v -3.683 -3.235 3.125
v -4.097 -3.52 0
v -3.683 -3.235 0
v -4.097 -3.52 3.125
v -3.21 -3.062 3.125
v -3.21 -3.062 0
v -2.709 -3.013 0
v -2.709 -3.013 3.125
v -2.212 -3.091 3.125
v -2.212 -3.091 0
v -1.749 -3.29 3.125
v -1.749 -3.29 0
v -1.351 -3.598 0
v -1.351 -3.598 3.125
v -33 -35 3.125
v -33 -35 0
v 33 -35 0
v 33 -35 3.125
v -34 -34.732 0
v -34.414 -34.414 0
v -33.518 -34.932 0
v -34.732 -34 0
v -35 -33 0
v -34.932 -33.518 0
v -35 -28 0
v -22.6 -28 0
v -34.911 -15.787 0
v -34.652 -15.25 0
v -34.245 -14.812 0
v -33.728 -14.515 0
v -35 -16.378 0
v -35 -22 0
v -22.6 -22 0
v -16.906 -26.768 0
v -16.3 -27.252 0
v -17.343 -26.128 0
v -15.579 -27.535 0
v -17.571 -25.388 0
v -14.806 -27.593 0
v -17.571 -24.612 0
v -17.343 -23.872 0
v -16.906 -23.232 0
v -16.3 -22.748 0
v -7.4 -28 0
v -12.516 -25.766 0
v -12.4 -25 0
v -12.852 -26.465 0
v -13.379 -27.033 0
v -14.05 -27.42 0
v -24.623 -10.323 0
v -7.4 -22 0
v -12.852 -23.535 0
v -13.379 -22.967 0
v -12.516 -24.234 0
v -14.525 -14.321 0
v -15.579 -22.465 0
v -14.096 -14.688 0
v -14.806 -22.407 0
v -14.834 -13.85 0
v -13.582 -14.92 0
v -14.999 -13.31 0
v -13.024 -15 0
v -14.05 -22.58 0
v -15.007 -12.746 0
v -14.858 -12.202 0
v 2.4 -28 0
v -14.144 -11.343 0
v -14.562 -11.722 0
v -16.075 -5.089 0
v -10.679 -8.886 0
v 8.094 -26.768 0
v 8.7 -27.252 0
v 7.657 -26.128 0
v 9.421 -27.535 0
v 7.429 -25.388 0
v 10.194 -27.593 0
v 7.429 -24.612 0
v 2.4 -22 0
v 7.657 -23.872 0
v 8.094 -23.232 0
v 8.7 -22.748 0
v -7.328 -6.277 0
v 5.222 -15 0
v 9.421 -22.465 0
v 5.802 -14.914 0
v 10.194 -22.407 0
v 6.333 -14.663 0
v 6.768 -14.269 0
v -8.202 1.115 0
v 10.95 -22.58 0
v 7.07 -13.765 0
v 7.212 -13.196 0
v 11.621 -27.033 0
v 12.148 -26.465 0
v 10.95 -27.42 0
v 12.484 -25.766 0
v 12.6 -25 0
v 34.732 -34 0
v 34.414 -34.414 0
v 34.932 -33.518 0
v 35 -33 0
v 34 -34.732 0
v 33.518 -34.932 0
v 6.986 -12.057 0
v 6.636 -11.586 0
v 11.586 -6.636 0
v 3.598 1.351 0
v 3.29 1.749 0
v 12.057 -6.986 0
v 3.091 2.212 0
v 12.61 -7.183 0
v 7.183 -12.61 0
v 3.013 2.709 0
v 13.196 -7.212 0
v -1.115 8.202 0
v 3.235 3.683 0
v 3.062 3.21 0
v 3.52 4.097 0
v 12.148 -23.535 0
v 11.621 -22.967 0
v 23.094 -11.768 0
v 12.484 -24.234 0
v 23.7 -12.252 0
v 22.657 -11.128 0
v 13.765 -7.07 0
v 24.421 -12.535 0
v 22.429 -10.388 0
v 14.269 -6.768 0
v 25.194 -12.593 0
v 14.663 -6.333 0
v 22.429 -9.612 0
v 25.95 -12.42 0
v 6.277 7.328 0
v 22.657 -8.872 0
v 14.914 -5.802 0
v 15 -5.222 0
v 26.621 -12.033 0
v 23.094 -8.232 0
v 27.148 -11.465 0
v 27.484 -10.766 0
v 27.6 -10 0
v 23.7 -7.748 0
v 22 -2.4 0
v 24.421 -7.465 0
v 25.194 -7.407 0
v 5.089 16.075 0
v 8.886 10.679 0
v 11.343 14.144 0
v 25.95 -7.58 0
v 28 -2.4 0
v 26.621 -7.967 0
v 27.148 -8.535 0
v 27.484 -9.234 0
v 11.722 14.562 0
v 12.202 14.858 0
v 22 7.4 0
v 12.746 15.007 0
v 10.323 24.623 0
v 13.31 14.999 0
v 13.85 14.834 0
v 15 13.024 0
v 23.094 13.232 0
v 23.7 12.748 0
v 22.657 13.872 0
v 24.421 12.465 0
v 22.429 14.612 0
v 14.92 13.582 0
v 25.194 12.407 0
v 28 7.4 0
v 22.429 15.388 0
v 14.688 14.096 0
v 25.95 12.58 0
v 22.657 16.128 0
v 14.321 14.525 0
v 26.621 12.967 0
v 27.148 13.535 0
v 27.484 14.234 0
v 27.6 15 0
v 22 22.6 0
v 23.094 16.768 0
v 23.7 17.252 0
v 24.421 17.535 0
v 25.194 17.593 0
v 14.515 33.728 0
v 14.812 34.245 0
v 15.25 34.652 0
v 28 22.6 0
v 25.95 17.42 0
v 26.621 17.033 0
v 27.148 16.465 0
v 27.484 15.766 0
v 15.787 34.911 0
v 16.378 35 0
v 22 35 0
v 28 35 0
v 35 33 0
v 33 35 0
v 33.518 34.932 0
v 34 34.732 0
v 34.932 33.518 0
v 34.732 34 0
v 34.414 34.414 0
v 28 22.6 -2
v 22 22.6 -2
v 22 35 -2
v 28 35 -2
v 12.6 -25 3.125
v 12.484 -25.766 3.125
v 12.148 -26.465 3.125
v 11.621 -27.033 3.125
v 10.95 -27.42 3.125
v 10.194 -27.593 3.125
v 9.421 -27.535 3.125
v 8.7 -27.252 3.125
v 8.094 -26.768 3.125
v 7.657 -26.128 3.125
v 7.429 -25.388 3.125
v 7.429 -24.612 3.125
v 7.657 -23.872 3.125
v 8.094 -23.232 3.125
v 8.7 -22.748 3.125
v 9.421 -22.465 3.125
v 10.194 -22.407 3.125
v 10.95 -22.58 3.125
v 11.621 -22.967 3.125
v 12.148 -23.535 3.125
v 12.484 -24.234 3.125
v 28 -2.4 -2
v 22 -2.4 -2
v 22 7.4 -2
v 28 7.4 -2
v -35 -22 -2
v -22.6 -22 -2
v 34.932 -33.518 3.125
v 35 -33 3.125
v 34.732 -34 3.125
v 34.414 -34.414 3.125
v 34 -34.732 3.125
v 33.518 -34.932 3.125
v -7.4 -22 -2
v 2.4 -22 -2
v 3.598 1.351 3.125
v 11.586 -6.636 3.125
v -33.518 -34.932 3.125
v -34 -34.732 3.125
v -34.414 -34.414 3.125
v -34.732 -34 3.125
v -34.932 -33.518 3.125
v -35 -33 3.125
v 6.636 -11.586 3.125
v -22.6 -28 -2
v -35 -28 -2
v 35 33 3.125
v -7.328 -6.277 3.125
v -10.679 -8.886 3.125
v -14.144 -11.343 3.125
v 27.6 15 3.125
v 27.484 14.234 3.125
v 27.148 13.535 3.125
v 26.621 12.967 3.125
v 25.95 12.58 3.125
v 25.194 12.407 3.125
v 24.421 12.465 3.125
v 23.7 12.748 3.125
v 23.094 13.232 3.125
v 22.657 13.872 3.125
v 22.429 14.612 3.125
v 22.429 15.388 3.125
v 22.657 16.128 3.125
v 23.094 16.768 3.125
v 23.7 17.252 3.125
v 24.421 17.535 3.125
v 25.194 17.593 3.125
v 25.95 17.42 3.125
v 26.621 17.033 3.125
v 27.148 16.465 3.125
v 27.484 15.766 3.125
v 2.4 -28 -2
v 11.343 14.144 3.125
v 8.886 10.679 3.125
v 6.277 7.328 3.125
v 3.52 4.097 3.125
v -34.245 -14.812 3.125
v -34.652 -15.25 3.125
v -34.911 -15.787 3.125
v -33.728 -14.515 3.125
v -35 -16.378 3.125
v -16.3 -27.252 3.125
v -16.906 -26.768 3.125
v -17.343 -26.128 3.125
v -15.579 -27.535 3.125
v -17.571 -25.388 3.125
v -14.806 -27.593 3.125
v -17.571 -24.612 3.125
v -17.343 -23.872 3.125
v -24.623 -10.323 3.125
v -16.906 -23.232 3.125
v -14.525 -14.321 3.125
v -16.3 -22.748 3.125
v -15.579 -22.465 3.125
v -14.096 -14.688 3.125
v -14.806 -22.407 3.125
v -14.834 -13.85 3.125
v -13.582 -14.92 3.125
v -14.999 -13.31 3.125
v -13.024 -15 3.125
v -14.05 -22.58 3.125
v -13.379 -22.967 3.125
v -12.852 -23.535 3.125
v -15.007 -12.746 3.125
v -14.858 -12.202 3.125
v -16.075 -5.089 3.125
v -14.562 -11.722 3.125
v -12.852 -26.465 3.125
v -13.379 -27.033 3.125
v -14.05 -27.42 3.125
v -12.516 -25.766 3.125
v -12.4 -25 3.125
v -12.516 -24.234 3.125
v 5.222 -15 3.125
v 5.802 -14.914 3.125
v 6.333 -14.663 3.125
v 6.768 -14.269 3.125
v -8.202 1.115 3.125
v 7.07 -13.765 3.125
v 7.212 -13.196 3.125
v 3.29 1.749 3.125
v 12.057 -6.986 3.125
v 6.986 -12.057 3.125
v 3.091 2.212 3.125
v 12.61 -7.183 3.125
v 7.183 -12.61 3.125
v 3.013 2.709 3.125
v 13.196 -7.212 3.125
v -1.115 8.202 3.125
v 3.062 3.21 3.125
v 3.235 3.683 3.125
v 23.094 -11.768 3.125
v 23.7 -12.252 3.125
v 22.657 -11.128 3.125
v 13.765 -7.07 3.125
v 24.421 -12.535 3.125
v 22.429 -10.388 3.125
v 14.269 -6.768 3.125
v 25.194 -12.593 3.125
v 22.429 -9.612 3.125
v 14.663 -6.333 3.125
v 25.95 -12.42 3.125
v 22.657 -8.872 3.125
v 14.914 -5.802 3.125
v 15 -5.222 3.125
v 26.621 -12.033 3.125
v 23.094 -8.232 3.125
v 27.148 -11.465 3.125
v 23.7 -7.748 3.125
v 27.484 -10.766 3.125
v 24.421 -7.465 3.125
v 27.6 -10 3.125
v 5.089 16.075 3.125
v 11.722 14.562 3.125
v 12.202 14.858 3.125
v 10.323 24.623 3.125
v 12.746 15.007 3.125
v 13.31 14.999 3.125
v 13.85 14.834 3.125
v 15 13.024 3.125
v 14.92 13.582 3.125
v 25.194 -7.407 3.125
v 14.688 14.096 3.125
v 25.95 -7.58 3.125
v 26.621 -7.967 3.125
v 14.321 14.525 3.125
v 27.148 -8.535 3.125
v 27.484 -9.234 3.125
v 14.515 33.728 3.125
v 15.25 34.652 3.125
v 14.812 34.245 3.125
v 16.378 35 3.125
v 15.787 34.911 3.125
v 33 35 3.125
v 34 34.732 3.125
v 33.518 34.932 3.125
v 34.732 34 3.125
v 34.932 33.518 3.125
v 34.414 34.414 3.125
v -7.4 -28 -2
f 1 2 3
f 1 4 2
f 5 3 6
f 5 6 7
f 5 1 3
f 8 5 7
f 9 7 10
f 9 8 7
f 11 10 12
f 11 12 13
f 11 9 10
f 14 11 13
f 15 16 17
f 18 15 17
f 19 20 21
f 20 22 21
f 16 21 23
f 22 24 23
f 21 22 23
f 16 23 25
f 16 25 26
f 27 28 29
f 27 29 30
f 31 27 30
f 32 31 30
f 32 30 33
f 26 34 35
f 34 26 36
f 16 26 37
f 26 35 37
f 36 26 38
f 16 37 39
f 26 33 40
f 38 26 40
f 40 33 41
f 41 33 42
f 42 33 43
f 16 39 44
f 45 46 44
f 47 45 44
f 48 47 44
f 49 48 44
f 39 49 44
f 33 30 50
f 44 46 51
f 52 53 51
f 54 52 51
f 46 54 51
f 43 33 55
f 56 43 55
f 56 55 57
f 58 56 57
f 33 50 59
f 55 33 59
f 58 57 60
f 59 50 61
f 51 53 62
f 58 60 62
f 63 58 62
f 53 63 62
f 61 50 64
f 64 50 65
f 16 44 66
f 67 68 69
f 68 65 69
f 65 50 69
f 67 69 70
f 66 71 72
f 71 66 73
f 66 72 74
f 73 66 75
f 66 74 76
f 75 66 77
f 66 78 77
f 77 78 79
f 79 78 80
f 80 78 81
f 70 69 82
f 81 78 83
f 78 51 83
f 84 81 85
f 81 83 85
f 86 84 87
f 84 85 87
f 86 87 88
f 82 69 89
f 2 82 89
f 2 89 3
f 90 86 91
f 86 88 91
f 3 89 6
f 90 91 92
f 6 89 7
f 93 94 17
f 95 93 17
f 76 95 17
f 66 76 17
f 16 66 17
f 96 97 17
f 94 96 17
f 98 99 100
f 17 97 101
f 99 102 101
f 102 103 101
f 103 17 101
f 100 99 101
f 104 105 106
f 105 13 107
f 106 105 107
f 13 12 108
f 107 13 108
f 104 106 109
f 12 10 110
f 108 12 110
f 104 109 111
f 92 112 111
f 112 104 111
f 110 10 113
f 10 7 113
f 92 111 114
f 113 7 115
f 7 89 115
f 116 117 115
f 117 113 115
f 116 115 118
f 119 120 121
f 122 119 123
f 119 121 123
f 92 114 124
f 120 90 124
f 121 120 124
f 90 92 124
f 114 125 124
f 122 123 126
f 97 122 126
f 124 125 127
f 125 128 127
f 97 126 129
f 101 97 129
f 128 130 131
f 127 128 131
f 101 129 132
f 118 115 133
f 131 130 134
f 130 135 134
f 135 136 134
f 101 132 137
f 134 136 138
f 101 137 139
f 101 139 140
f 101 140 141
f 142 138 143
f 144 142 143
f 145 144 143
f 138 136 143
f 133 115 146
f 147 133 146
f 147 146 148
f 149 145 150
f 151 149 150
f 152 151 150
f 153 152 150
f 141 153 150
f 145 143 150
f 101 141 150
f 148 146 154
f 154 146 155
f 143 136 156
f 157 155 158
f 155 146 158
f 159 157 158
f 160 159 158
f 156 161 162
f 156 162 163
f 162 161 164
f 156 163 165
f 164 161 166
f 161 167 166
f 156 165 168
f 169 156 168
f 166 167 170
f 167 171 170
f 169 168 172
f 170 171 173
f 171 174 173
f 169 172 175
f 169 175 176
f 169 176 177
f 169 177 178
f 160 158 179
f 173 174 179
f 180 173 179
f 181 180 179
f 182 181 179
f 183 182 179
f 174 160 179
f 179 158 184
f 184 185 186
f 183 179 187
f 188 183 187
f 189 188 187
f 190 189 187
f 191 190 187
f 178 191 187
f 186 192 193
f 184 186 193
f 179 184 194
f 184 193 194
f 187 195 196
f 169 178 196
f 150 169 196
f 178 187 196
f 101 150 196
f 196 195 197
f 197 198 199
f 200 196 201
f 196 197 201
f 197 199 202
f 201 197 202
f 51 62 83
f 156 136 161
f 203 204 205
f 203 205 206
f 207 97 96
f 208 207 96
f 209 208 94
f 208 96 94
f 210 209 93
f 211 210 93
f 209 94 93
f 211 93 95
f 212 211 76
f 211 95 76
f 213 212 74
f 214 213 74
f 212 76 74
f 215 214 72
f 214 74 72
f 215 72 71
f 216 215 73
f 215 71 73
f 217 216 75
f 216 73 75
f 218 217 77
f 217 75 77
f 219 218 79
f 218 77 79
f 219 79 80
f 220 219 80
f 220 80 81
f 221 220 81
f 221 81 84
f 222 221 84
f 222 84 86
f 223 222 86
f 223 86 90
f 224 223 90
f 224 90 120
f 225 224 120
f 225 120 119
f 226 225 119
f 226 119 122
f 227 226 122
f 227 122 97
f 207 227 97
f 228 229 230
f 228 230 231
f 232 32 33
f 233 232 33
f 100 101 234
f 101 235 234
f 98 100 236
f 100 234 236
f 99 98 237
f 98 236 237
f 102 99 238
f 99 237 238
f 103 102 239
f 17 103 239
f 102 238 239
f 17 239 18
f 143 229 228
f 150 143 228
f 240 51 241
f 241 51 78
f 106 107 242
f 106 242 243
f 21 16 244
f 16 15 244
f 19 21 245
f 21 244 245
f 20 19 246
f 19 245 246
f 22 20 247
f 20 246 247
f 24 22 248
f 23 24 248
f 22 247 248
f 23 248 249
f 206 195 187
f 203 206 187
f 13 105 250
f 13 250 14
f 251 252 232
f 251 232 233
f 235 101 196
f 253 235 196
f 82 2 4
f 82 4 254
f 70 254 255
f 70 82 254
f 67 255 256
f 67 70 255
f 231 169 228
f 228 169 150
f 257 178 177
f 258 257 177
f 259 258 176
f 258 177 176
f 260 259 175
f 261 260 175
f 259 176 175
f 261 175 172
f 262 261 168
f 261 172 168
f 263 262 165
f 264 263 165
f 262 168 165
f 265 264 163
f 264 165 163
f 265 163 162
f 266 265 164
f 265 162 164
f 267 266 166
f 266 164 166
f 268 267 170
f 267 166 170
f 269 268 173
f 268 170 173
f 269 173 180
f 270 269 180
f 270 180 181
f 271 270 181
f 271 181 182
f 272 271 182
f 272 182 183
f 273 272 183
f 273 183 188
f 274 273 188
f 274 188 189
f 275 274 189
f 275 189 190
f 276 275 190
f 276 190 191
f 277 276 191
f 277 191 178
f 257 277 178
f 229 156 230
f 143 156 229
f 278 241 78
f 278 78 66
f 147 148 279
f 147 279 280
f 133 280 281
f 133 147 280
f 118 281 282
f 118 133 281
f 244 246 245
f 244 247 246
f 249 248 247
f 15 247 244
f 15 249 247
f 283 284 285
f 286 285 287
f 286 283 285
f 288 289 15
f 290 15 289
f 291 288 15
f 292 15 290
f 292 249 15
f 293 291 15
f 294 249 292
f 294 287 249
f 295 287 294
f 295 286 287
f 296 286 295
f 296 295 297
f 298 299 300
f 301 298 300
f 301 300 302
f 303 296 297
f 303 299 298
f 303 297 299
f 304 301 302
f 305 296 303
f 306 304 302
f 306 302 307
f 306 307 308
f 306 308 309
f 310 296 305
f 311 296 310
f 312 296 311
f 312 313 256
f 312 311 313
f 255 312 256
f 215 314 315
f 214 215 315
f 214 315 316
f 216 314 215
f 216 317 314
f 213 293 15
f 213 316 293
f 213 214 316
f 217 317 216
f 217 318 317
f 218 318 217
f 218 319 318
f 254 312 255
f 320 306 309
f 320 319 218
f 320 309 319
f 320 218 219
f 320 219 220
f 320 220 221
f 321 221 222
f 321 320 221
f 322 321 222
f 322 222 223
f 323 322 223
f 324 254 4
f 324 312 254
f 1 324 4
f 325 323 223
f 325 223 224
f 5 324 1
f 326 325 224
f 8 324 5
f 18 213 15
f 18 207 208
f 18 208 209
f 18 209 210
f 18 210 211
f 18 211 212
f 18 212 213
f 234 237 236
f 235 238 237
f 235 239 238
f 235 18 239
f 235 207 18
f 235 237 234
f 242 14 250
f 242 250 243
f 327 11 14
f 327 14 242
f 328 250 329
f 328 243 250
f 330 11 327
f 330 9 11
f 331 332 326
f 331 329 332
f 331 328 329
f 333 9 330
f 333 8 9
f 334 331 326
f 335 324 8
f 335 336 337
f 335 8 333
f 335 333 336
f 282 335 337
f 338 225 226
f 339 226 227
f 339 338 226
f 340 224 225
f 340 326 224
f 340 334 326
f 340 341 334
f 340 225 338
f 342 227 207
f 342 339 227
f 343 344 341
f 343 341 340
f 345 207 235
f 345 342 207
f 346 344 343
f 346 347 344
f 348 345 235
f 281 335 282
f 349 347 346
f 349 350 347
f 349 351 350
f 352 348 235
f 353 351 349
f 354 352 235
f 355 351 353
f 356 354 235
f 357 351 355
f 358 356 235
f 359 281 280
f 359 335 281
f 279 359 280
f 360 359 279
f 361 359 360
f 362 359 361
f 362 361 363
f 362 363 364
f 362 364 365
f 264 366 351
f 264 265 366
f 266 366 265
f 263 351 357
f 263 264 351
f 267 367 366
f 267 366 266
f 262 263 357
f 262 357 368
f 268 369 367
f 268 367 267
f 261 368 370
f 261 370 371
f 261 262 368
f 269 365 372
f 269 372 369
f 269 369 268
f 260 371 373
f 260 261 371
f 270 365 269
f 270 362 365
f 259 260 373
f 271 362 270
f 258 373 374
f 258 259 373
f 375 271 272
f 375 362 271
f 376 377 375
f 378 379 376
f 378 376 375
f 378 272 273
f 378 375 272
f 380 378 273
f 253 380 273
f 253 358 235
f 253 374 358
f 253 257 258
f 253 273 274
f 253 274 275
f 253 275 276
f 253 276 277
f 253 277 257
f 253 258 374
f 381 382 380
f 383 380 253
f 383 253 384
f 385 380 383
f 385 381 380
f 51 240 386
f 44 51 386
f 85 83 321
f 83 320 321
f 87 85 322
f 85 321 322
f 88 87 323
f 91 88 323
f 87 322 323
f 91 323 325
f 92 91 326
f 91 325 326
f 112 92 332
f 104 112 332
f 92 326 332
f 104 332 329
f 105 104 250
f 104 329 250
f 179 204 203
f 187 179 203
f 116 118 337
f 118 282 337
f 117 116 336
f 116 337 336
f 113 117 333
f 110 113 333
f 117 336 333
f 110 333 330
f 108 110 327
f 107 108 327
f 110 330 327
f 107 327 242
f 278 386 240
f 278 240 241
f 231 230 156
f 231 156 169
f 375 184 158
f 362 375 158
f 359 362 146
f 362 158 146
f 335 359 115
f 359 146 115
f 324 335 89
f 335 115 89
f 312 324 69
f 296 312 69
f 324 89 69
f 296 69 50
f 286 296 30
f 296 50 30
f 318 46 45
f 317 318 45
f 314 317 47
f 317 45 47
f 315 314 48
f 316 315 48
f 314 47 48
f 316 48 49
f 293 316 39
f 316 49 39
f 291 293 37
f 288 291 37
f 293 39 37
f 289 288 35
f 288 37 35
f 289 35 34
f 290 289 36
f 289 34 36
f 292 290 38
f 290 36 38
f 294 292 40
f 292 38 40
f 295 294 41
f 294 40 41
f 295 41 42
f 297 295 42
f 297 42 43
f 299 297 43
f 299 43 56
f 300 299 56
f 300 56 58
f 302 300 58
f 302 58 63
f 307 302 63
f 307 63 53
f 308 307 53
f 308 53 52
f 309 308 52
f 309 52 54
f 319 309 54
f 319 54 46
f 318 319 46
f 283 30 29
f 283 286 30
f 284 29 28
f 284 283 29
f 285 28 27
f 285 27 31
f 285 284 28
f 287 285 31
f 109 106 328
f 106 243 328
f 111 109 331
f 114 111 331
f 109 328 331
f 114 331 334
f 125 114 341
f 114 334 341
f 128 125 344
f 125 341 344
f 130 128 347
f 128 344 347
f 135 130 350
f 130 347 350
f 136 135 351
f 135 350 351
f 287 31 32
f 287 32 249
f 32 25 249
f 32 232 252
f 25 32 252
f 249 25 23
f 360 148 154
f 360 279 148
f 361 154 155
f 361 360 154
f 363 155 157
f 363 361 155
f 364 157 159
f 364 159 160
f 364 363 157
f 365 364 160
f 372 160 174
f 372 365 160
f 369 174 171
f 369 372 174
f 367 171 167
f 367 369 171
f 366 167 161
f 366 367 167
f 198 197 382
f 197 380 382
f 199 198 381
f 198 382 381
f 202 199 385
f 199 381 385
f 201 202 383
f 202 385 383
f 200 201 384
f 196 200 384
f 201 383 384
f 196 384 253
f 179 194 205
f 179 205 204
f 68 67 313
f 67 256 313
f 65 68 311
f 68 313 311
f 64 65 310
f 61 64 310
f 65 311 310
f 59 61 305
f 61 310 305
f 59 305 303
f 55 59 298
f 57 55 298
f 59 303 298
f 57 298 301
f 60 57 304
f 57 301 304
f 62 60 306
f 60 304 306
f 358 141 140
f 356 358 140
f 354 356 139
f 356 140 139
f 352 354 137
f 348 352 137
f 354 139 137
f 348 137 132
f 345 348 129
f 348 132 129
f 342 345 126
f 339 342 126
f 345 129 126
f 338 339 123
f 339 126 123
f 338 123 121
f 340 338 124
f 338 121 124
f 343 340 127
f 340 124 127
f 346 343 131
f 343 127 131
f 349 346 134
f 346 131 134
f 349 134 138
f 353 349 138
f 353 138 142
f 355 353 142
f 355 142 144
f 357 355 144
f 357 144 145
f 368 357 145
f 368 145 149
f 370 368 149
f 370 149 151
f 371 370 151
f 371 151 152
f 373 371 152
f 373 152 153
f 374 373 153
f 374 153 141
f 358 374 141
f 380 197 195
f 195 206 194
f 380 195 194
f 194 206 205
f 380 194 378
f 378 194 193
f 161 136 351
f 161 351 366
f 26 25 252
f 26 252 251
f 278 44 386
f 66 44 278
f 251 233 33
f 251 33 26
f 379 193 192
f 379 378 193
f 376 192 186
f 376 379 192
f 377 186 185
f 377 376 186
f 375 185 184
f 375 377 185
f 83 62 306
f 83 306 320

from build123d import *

# Parameters (mm, degrees)
F1_DEPTH  = 3.125
F2_W      = 6
F2_H      = 50
F2_W_2    = 50
F2_H_2    = 6
F3_DEPTH  = 2
F4_R      = 2.6
F5_DEPTH  = 25
F6_W      = 6
F6_H      = 12.6
F6_H_2    = 15.2
F7_DEPTH  = 2
F8_W      = 12.6
F8_H      = 6
F8_W_2    = 15.2
F9_DEPTH  = 2
F10_R     = 2
F12_DEPTH = 25
F13_R     = 2


# Not quite as in the source:
# - a feature names something its author has since deleted; it is built from what else it names


with BuildPart() as f1:
    # F0 (on Top) → F1 (new body)
    with BuildSketch(Plane.XY):
        with BuildLine():
            Line((35, 35), (15, 35))
            ThreePointArc((15, 35), (-4.5539513718, 4.5539513718), (-35, -15))
            Line((-35, -15), (-35, -35))
            Line((-35, -35), (35, -35))
            Line((35, -35), (35, 35))
        make_face()
    extrude(amount=F1_DEPTH)

    # F2 (on face) → F3 (join)
    with BuildSketch(Plane(origin=(0, 0, 0), x_dir=(1, 0, 0), z_dir=(0, 0, -1))):
        with Locations((25, -10)):
            Rectangle(F2_W, F2_H)
        with Locations((-10, 25)):
            Rectangle(F2_W_2, F2_H_2)
    extrude(amount=F3_DEPTH)

    # F4 (on face) → F5 (cut)
    with BuildSketch(Plane(origin=(0, 0, -2), x_dir=(1, 0, 0), z_dir=(0, 0, -1))):
        with Locations((25, -15)):
            Circle(F4_R)
        with Locations((25, 10)):
            Circle(F4_R)
        with Locations((10, 25)):
            Circle(F4_R)
        with Locations((-15, 25)):
            Circle(F4_R)
    extrude(amount=-F5_DEPTH, mode=Mode.SUBTRACT)

    # F6 (on face) → F7 (cut)
    with BuildSketch(Plane(origin=(0, 0, -2), x_dir=(1, 0, 0), z_dir=(0, 0, -1))):
        with Locations((25, 8.7)):
            Rectangle(F6_W, F6_H)
        with Locations((25, -15)):
            Rectangle(F6_W, F6_H_2)
    extrude(amount=-F7_DEPTH, mode=Mode.SUBTRACT)

    # F8 (on face) → F9 (cut)
    with BuildSketch(Plane(origin=(0, 0, -2), x_dir=(1, 0, 0), z_dir=(0, 0, -1))):
        with Locations((8.7, 25)):
            Rectangle(F8_W, F8_H)
        with Locations((-15, 25)):
            Rectangle(F8_W_2, F8_H)
    extrude(amount=-F9_DEPTH, mode=Mode.SUBTRACT)

    # F10
    f10_edges = [f1.edges().sort_by_distance(p)[0] for p in [
        (35, 35, 1.5625),
        (15, 35, 1.5625),
        (-35, -15, 1.5625),
        (-35, -35, 1.5625),
        (35, -35, 1.5625),
    ]]
    fillet(f10_edges, radius=F10_R)

    # F11 (on Top) → F12 (cut)
    with BuildSketch(Plane.XY):
        with BuildLine():
            Line((15, -10.0502525317), (15, 20))
            ThreePointArc((15, 20), (9.1151461726, 10.9887424757), (2.2488038315, 2.7009436368))
            Line((2.2488038315, 2.7009436368), (15, -10.0502525317))
        make_face()
        with BuildLine():
            ThreePointArc((-2.7009436368, -2.2488038315), (-10.9887424757, -9.1151461726), (-20, -15))
            Line((-20, -15), (10.0502525317, -15))
            Line((10.0502525317, -15), (-2.7009436368, -2.2488038315))
        make_face()
    extrude(amount=F12_DEPTH, mode=Mode.SUBTRACT)

    # F13
    f13_edges = [f1.edges().sort_by_distance(p)[0] for p in [
        (15, 20, 1.5625),
        (-20, -15, 1.5625),
        (2.248804, 2.700944, 1.5625),
        (-2.700944, -2.248804, 1.5625),
        (10.050253, -15, 1.5625),
        (15, -10.050253, 1.5625),
    ]]
    fillet(f13_edges, radius=F13_R)


solid = f1.part
